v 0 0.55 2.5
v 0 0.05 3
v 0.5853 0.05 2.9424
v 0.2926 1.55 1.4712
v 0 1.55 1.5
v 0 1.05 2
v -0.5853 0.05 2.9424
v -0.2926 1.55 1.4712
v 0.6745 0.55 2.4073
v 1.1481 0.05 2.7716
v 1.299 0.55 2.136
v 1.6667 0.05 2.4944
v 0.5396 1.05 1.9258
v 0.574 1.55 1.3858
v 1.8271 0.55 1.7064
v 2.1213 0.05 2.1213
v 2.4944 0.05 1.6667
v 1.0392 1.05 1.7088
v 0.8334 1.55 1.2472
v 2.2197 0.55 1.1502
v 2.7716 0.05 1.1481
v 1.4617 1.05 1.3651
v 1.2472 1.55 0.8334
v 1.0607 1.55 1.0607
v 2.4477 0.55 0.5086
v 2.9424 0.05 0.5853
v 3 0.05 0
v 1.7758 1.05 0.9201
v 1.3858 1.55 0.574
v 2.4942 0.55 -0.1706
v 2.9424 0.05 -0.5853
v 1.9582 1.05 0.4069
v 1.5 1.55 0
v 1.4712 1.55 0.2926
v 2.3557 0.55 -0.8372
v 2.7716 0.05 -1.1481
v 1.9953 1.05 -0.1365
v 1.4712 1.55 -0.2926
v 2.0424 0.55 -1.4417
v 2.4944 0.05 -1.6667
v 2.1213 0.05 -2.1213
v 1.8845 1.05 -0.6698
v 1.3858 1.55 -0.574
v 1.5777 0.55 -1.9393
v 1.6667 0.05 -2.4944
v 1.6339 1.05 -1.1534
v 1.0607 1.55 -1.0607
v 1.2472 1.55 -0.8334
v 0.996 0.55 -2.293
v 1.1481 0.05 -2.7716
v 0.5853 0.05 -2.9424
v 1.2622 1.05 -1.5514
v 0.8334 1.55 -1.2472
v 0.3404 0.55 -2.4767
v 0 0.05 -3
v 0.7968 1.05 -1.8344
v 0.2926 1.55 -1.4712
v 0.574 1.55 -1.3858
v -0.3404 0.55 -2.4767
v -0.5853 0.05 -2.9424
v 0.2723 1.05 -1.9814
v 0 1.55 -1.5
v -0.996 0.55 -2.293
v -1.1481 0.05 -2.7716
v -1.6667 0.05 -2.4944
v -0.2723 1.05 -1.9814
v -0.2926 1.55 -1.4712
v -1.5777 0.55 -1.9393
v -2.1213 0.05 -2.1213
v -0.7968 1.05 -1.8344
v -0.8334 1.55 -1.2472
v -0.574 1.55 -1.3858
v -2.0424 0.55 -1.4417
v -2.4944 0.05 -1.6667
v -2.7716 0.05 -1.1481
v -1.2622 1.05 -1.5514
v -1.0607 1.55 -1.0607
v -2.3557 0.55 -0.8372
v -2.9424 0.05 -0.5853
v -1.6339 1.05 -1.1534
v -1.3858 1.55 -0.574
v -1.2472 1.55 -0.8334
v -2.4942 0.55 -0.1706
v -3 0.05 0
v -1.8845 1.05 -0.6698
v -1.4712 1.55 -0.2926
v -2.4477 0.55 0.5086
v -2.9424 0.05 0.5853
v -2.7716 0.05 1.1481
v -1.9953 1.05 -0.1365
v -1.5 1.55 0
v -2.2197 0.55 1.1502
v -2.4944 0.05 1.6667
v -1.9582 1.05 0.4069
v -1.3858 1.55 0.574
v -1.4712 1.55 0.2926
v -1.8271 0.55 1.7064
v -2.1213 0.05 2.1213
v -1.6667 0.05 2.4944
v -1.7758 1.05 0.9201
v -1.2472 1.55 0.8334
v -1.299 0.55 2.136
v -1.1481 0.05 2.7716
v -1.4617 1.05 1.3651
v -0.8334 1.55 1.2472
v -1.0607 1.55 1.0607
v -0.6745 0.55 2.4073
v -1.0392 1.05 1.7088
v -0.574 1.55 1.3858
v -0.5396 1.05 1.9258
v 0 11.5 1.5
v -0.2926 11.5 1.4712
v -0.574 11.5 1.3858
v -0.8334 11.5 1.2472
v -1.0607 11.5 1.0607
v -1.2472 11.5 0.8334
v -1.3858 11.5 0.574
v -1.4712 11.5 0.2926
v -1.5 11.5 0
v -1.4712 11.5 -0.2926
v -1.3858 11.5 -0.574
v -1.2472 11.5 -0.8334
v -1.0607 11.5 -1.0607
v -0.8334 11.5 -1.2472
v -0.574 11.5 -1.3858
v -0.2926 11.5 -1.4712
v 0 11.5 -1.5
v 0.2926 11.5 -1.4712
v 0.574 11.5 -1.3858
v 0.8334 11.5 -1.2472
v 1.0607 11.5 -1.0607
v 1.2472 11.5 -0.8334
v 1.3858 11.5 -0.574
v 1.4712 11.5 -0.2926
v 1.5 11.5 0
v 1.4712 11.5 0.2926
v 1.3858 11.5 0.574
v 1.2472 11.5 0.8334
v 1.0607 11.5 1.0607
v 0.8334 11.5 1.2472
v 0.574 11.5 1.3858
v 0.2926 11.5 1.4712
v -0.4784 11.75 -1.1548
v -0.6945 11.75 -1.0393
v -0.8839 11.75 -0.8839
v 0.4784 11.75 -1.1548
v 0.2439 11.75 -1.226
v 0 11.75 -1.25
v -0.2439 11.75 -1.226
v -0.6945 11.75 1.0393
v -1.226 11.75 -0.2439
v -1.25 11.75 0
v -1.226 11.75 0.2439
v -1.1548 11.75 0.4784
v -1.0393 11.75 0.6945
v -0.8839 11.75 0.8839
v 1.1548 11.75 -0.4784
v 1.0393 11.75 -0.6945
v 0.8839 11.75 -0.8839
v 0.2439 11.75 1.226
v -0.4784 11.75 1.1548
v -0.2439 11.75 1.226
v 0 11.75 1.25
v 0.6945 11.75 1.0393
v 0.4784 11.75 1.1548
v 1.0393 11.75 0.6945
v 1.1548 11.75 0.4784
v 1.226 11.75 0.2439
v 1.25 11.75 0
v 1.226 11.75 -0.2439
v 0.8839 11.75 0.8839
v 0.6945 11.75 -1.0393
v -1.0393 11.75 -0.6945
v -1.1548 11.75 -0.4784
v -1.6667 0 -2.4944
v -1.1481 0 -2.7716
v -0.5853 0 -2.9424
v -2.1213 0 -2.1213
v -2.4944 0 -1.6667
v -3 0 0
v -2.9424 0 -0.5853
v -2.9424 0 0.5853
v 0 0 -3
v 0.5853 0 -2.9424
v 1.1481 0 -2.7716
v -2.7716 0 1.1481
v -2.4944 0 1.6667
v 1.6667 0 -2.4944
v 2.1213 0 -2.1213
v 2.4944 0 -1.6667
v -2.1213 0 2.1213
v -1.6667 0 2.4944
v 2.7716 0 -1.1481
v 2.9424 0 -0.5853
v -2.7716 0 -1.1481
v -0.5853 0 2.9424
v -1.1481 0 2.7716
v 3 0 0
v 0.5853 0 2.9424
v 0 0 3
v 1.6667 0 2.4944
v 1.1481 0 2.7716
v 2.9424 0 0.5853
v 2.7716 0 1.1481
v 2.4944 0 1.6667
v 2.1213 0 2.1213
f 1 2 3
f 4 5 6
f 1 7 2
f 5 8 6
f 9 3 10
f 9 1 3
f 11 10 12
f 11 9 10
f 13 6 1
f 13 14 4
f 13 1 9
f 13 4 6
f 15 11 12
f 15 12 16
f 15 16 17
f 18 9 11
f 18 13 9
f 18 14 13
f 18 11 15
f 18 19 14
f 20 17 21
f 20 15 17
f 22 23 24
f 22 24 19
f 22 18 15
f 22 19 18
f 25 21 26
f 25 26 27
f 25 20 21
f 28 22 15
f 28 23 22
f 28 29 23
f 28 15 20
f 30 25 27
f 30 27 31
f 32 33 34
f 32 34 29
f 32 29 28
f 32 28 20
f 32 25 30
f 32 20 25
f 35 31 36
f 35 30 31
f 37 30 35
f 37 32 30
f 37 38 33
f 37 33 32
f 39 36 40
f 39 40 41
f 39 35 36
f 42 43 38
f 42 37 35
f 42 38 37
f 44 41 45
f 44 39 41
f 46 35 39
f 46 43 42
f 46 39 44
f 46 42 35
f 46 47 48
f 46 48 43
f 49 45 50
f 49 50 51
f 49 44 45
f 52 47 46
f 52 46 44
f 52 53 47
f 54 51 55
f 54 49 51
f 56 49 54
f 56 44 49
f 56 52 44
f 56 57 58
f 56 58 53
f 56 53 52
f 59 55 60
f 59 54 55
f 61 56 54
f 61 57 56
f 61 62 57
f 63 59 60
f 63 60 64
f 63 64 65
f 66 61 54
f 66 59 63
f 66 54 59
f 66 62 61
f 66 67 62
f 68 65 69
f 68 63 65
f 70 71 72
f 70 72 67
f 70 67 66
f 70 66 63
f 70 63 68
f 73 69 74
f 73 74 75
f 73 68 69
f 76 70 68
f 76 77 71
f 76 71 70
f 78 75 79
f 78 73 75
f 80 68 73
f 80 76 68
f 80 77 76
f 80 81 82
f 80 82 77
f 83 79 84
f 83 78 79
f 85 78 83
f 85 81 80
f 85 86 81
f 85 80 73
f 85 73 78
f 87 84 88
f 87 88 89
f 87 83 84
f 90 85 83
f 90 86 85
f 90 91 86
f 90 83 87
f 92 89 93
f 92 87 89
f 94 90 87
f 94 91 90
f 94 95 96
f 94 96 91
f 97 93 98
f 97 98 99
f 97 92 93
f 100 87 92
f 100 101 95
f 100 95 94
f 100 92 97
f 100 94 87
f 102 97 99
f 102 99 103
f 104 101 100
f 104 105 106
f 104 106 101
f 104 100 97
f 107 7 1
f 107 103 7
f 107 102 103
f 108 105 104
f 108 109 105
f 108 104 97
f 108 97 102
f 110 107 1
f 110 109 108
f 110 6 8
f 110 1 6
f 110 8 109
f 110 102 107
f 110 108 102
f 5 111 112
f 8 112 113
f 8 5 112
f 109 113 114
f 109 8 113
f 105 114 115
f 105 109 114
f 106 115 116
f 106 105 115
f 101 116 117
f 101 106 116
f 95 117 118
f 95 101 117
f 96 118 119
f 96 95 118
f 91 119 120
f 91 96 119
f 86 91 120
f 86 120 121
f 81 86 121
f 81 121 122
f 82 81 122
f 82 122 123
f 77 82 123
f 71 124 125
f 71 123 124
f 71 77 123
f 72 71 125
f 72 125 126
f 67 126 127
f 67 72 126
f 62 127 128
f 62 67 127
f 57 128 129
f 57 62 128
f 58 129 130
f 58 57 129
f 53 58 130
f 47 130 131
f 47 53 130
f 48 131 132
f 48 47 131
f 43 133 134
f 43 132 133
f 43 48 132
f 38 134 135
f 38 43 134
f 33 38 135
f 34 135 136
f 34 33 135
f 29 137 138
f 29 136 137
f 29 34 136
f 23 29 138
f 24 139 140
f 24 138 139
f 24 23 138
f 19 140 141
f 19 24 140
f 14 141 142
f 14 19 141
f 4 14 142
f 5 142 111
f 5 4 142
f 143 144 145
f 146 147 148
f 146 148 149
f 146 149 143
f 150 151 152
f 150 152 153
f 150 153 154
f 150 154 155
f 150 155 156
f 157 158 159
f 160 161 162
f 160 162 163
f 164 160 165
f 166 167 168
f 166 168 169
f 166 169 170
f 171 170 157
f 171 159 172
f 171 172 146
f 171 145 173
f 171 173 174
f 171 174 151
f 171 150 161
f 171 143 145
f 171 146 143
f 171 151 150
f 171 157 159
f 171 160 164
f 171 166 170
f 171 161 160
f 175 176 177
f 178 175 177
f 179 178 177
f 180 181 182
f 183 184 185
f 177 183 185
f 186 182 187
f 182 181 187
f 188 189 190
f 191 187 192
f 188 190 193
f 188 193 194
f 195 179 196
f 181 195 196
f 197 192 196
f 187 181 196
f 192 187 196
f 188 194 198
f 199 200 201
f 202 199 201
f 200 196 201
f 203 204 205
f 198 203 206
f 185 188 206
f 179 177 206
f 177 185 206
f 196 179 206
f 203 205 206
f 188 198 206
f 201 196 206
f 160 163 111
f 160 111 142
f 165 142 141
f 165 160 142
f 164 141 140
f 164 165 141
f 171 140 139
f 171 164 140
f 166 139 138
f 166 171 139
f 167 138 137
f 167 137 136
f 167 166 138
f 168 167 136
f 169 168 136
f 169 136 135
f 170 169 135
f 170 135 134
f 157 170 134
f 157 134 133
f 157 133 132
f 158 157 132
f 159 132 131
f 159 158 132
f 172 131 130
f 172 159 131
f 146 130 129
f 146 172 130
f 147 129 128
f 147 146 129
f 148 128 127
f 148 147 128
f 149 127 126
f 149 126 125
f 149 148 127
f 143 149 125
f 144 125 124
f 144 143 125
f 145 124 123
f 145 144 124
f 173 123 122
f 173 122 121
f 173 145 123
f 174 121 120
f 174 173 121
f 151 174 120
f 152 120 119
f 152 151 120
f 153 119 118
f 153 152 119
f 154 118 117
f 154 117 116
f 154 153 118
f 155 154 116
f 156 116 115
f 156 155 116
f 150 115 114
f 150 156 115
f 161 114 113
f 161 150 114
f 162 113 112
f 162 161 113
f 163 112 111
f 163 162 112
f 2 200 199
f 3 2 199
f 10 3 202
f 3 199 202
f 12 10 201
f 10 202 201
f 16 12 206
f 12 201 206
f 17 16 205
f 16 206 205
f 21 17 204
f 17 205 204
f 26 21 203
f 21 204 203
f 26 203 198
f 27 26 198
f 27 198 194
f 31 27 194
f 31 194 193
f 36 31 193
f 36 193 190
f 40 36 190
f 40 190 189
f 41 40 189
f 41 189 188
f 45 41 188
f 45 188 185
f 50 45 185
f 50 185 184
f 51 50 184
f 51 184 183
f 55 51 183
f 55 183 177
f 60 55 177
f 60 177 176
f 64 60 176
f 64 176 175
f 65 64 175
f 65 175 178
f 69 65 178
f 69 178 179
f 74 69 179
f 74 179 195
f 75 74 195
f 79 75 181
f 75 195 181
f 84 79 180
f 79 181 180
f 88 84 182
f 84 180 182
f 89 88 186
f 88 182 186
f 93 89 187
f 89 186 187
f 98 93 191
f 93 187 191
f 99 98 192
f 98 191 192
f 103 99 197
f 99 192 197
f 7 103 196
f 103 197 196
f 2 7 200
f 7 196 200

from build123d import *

# Parameters (mm, degrees)
SKETCH1_R           = 3
BOSS_EXTRUDE1_DEPTH = 1.75
SKETCH2_R           = 1.5
BOSS_EXTRUDE2_DEPTH = 10
CHAMFER1_SIZE       = 1.7
CHAMFER2_SIZE       = 0.25


with BuildPart() as part:
    # Sketch1 → Boss-Extrude1 (new body)
    with BuildSketch(Plane(origin=(0, 0, 0), x_dir=(1, 0, 0), z_dir=(0, 1, 0))):
        with Locations(Location((0, 0, 0), (0, 0, 270))):
            Circle(SKETCH1_R)
    extrude(amount=BOSS_EXTRUDE1_DEPTH)

    # Sketch2 → Boss-Extrude2 (add)
    with BuildSketch(Plane(origin=(0, 1.75, 0), x_dir=(1, 0, 0), z_dir=(0, 1, 0))):
        with Locations(Location((0, 0, 0), (0, 0, 270))):
            Circle(SKETCH2_R)
    extrude(amount=BOSS_EXTRUDE2_DEPTH)

    # Chamfer1
    # the kernel refuses this chamfer: 1.7 mm, written as the material it takes off along each edge
    with BuildSketch(Plane(origin=(0, 1.75, 0), x_dir=(0, 0, 1), z_dir=(-1, 0, 0))) as chamfer1_piece_1_section:
        Polygon((3, -CHAMFER1_SIZE), (3 - CHAMFER1_SIZE, 0), (3, 0), align=None)
    chamfer1_piece_1 = revolve(axis=Axis((0, 1.75, 0), (0, 1, 0)), mode=Mode.PRIVATE)
    chamfer1_piece_1 = chamfer1_piece_1 - Plane(origin=(0, 0.796367942, 0), x_dir=(0, 0, 1), z_dir=(0, -1, 0)) * Cylinder(1.5, 12, mode=Mode.PRIVATE)
    add(chamfer1_piece_1, mode=Mode.SUBTRACT)

    # Chamfer2
    chamfer2_edges = [part.edges().sort_by_distance(p)[0] for p in [
        (0, 11.75, -1.5),
    ]]
    chamfer(chamfer2_edges, length=CHAMFER2_SIZE)


solid = part.part
